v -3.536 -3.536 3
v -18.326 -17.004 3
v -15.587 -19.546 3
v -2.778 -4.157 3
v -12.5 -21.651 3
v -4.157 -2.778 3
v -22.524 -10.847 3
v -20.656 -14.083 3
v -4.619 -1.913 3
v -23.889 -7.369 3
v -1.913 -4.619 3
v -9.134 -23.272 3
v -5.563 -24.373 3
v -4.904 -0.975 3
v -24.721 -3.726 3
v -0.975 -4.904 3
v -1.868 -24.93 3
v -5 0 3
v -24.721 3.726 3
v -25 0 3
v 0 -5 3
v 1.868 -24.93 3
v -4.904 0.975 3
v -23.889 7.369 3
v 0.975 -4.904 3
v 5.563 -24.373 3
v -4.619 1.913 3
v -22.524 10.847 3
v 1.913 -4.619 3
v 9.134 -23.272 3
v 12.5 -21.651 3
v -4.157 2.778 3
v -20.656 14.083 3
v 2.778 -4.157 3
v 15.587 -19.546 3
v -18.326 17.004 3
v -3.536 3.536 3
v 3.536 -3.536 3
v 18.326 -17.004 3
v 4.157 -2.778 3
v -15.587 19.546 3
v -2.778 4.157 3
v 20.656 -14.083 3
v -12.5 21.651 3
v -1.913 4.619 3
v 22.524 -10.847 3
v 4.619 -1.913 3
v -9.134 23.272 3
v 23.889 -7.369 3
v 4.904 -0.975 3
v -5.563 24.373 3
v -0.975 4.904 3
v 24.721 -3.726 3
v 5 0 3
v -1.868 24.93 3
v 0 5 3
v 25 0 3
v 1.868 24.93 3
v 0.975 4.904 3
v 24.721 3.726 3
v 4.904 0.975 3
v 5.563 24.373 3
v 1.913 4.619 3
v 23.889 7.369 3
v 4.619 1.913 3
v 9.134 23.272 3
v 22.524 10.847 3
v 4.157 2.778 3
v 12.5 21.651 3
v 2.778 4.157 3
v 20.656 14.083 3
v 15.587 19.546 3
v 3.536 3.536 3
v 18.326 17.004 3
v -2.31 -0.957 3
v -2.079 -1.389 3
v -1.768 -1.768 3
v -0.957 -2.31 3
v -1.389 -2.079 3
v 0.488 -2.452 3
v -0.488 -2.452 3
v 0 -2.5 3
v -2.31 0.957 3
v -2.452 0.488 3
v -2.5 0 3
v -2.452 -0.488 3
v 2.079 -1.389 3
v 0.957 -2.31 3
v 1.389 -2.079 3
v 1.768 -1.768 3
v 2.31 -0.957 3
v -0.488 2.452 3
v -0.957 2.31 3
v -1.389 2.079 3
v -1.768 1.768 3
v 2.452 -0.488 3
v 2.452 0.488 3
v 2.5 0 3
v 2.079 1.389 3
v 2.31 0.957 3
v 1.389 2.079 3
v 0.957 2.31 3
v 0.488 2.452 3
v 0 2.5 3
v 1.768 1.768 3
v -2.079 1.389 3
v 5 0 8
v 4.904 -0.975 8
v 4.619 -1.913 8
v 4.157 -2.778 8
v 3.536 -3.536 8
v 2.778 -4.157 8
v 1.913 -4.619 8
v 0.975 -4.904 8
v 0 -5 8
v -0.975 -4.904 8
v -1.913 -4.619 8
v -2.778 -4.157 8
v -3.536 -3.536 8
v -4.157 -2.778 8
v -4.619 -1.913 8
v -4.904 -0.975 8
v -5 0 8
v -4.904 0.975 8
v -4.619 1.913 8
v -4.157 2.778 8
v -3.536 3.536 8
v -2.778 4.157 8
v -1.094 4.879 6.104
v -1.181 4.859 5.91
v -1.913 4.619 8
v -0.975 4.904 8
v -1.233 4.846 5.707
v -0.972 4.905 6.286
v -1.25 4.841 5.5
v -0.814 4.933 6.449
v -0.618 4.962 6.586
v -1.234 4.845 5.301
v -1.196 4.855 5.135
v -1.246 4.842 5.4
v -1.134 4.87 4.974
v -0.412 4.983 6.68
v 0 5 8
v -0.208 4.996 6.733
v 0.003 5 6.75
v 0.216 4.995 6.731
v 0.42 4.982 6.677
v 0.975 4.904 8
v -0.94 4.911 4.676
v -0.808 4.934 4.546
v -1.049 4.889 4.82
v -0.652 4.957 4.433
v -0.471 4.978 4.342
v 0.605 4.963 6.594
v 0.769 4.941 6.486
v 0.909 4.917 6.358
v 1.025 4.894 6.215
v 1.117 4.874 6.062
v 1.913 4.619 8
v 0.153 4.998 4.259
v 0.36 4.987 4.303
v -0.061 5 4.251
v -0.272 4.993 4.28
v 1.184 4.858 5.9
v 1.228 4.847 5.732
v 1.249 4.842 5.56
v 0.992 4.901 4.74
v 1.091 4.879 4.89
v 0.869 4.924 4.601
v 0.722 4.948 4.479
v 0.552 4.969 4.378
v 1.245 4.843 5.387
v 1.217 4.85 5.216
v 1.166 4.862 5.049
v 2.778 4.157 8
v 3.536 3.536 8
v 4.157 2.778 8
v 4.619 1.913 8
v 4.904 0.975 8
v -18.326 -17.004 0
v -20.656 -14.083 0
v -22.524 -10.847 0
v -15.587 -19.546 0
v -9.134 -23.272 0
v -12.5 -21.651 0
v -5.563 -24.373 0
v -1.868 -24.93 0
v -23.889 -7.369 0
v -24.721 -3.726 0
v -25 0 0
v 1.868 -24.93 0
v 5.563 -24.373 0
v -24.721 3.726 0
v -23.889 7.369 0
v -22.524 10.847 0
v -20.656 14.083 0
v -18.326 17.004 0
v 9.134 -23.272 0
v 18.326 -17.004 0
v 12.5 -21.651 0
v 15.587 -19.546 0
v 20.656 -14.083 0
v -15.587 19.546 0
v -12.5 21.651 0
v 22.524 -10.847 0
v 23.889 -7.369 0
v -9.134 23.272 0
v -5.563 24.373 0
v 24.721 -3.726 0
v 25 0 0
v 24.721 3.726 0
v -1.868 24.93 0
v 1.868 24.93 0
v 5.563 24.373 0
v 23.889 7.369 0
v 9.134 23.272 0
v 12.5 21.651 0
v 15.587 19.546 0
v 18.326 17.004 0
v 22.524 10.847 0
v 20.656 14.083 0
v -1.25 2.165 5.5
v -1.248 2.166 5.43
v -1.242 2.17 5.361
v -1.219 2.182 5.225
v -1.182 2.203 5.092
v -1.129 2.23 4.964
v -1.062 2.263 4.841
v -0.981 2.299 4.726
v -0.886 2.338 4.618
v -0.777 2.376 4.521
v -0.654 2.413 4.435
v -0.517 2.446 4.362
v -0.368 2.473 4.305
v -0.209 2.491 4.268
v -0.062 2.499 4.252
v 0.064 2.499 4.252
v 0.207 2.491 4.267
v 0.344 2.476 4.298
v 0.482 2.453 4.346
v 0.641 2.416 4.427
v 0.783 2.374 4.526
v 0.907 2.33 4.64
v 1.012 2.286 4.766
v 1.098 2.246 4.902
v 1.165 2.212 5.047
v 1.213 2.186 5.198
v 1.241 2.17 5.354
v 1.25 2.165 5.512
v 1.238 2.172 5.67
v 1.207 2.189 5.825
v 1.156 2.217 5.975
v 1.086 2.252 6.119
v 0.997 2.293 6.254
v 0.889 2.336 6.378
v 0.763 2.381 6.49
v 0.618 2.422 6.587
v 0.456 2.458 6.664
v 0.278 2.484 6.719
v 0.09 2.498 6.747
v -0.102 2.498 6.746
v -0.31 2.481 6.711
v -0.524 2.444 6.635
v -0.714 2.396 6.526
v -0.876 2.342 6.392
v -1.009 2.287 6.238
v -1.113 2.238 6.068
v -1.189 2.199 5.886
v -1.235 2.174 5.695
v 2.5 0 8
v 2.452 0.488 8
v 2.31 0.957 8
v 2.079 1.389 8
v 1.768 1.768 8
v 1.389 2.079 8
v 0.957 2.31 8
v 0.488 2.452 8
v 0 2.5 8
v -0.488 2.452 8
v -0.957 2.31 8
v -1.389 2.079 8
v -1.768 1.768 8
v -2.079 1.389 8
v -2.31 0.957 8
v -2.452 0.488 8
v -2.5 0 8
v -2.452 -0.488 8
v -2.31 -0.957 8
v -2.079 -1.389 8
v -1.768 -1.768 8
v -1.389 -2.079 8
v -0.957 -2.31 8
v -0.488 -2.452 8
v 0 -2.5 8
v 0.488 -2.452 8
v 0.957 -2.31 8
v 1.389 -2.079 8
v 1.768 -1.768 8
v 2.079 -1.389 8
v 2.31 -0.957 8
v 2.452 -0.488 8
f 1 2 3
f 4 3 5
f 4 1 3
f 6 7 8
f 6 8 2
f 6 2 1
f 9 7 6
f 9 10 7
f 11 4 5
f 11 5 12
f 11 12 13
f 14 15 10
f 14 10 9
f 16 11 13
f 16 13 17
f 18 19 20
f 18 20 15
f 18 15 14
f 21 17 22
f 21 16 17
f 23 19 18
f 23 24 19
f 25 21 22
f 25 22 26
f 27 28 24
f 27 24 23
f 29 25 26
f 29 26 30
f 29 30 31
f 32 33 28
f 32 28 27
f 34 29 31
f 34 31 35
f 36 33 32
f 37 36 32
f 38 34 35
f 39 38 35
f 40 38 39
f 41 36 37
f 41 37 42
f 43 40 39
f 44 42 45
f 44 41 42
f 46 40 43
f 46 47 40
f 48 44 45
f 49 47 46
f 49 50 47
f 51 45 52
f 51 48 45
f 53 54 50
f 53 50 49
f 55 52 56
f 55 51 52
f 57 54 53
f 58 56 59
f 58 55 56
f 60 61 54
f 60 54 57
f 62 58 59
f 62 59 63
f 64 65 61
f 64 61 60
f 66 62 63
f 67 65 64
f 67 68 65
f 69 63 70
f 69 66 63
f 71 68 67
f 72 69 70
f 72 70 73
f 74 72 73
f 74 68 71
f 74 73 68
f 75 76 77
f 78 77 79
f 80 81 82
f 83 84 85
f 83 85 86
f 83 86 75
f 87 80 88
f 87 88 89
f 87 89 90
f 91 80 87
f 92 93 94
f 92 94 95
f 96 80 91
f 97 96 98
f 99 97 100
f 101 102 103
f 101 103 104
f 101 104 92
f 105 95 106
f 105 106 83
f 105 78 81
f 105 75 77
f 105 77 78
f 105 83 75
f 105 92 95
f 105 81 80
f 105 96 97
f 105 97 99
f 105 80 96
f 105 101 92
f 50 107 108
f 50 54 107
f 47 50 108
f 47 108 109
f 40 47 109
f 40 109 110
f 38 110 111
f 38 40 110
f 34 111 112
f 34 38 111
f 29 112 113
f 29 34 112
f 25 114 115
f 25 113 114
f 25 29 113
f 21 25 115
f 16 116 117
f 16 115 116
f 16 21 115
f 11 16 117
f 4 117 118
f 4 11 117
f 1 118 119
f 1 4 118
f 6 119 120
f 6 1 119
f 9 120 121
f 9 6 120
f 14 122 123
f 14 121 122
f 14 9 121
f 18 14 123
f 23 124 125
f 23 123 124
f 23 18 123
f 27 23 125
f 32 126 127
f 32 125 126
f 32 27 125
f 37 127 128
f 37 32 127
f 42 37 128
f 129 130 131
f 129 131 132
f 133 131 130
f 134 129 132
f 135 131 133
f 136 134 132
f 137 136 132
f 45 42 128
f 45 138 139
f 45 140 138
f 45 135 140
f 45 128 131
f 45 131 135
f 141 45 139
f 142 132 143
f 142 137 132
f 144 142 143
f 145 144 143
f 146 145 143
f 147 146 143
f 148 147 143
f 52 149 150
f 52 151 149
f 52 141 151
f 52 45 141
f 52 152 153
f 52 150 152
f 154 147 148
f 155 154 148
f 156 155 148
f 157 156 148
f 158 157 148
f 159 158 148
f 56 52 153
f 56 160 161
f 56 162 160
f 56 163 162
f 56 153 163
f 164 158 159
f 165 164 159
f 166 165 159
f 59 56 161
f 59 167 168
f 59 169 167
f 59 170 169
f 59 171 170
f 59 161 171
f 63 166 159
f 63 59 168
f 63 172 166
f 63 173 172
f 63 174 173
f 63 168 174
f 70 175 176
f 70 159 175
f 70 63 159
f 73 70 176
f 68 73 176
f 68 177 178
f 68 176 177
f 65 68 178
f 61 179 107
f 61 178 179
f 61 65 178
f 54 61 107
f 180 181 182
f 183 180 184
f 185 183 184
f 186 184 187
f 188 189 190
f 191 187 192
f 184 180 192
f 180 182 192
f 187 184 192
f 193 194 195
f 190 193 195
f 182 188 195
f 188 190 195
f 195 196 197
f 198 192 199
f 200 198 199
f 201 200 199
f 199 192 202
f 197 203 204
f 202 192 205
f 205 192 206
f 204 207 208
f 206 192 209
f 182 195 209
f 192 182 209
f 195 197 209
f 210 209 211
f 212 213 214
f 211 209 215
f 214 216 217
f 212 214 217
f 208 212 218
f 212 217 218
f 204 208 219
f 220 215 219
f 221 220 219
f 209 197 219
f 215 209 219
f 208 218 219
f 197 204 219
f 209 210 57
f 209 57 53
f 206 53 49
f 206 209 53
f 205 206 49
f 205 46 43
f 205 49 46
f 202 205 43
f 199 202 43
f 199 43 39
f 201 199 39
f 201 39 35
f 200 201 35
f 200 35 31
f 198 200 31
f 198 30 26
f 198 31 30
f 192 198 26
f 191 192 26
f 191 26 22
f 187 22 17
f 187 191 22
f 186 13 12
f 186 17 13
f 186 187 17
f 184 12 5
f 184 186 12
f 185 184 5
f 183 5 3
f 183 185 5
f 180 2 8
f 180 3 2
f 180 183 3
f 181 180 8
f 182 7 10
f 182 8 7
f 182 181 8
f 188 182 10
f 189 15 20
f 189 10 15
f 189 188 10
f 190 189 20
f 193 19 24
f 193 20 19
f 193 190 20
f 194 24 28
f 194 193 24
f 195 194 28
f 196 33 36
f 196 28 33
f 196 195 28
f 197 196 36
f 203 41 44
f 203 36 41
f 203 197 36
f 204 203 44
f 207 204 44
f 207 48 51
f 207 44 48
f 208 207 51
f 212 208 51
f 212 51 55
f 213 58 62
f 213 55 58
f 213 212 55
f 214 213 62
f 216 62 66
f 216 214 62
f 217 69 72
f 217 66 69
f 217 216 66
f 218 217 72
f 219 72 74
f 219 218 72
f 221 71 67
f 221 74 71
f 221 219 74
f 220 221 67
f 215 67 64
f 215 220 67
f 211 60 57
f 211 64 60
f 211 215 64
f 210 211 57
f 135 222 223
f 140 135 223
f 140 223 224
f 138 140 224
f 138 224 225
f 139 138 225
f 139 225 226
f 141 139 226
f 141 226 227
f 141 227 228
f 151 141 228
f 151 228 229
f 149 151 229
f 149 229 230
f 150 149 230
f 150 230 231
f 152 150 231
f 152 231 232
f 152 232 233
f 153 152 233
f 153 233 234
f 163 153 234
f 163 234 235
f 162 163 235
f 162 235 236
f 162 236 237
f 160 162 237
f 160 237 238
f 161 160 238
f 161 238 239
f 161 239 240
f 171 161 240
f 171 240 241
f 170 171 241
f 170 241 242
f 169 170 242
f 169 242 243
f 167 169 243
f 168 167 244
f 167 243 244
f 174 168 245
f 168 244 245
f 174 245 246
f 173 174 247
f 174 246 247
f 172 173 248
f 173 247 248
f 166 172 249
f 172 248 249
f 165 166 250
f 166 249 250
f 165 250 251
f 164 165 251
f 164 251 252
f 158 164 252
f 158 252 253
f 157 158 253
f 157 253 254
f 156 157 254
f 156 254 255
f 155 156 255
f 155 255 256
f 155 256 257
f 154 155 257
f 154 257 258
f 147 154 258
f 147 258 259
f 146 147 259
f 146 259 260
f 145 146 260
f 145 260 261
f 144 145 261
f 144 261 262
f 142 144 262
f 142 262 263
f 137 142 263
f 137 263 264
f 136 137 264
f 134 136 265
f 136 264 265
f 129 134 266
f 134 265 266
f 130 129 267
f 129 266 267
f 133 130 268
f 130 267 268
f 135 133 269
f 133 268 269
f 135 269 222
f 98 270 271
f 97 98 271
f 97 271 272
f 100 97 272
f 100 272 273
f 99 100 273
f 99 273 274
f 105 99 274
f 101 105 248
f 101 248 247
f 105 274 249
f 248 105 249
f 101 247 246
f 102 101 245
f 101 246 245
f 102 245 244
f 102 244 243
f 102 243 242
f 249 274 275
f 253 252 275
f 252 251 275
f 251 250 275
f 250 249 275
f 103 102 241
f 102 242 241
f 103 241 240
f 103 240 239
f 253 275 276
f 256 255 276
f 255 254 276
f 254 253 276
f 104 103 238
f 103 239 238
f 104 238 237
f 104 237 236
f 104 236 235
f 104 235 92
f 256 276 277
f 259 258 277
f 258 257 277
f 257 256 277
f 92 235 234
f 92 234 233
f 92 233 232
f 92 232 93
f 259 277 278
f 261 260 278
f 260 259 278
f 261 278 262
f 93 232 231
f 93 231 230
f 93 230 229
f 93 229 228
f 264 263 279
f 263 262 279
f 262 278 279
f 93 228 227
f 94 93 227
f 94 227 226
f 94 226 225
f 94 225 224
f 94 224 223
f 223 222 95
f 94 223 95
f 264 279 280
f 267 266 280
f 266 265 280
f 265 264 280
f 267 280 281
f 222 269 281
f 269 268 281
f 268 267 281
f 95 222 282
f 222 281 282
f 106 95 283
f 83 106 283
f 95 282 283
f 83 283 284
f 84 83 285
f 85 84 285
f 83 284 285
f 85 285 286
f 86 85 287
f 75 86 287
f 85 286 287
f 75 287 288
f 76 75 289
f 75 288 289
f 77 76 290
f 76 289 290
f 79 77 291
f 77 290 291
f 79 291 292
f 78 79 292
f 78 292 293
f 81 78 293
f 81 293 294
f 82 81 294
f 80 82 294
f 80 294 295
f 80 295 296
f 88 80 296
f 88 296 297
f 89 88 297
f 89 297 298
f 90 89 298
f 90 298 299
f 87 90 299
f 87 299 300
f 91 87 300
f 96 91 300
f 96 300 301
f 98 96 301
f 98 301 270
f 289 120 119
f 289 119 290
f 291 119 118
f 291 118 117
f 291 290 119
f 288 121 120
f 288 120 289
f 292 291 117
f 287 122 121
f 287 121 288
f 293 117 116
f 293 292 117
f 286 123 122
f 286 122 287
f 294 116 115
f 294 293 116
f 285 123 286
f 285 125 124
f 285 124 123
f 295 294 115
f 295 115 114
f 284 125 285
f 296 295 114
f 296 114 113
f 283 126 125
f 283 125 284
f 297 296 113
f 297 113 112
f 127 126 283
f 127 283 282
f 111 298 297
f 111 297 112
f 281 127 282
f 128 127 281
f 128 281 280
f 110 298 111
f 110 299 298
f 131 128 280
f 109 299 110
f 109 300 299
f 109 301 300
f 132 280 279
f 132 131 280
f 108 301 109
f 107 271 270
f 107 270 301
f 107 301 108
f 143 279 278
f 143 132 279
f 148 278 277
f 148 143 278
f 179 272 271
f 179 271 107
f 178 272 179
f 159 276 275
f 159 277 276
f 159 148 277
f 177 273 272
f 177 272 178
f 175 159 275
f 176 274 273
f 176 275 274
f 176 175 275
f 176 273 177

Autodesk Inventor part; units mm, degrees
ref_plane "YZ Plane" through (0, 0, 0) normal (1, 0, 0) x (0, 1, 0)
ref_plane "XZ Plane" through (0, 0, 0) normal (0, 1, 0) x (-1, 0, 0)
ref_plane "XY Plane" through (0, 0, 0) normal (0, 0, 1) x (1, 0, 0)
sketch "Sketch1" plane through (0, 0, 0) normal (0, 0, 1) x (1, 0, 0)
  circle A0 centre (0, 0) radius 25
  dimension "d0" = 50
extrude "Extrusion1" add sketch "Sketch1" along normal blind 3
sketch "Sketch2" plane through (0, 0, 3) normal (0, 0, 1) x (1, 0, 0)
  circle A0 centre (0, 0) radius 5
  dimension "d3" = 10
extrude "Extrusion2" add sketch "Sketch2" along normal blind 5
sketch "Sketch3" plane through (0, 0, 8) normal (0, 0, 1) x (1, 0, 0)
  circle A0 centre (0, 0) radius 2.5
  dimension "d6" = 5
extrude "Extrusion3" cut sketch "Sketch3" against normal blind 5
sketch "Sketch4" plane through (0, 0, 0) normal (0, 1, 0) x (-1, 0, 0)
  point P0 (0, 0)
sketch "Sketch5" plane through (0, 0, 0) normal (0, 1, 0) x (-1, 0, 0)
  point P0 (0, 0)
sketch "Sketch6" plane through (0, 0, 0) normal (0, 1, 0) x (-1, 0, 0)
  point P0 (0, 0)
sketch "Sketch7" plane through (0, 0, 0) normal (0, 1, 0) x (-1, 0, 0)
  line L0 (5, 8) -> (-5, 8) projected
  line L1 (0, 8) -> (0, 3)
  line L2 (25, 3) -> (-25, 3) projected
  circle A0 centre (0, 5.5) radius 1.25
  point P0 (0, 0)
  dimension "d9" = 2.5
extrude "Extrusion4" cut sketch "Sketch7" along normal blind 6.1125
thread "Thread1" size "M3x0.5" class "6H" standard "ANSI Metric M Profile" full length
properties part number "Tampa_RoloA"
